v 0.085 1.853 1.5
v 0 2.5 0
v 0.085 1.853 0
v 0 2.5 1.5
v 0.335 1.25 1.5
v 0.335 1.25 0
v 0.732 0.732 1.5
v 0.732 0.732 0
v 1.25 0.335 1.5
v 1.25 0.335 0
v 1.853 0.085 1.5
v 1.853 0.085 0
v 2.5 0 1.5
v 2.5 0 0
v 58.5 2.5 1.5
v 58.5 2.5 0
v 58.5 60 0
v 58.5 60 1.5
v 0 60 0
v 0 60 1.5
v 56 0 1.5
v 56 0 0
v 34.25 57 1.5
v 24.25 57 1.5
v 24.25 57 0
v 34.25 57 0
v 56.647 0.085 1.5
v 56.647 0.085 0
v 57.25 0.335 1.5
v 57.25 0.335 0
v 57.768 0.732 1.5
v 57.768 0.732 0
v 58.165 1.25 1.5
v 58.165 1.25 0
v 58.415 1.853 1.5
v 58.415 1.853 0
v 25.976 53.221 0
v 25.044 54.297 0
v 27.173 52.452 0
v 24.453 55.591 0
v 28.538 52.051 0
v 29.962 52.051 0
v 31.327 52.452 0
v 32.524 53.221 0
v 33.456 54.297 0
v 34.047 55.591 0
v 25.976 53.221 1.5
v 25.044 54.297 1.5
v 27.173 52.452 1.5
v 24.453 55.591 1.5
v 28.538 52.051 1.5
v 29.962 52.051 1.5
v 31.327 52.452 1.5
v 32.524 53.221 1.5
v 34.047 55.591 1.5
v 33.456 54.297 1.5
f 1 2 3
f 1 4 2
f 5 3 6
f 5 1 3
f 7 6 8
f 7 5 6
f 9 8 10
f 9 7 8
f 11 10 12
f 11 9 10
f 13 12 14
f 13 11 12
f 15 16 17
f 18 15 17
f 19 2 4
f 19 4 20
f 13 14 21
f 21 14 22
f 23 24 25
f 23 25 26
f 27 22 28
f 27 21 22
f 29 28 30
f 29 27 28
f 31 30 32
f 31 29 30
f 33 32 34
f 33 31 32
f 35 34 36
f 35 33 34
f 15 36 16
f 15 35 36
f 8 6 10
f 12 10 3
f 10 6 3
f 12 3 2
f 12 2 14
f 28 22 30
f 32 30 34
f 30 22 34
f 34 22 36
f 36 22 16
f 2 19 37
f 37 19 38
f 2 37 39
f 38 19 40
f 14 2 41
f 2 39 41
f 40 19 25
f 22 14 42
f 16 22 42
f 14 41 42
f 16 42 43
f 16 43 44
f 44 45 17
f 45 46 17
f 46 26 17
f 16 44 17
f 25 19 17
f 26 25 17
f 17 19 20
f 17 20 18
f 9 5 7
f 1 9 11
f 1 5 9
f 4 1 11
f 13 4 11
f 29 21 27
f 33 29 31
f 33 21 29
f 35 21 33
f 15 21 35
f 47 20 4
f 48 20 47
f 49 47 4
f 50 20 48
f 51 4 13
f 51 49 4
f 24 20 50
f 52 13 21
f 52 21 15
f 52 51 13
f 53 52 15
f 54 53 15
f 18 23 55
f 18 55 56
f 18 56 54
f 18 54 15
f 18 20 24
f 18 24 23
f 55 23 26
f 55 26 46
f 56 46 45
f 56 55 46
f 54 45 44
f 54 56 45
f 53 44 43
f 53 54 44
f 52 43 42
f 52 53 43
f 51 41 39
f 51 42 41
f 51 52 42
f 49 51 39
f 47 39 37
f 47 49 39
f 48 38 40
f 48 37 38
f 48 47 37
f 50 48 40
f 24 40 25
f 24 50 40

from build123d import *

# Parameters (mm, degrees)
SKETCH_1_W          = 58.5
SKETCH_1_H          = 60
EXTRUDE_1_DEPTH     = 1.5
FILLET_1_R          = 2.5
CUT_EXTRUDE_1_DEPTH = 2.5


with BuildPart() as part:
    # Эскиз1 → Бобышка-Вытянуть1 (new body)
    with BuildSketch(Plane.XY):
        with Locations((29.25, 30)):
            Rectangle(SKETCH_1_W, SKETCH_1_H)
    extrude(amount=EXTRUDE_1_DEPTH)

    # Скругление1
    fillet_1_edges = [part.edges().sort_by_distance(p)[0] for p in [
        (58.5, 0, 0.75),
        (0, 0, 0.75),
    ]]
    fillet(fillet_1_edges, radius=FILLET_1_R)

    # Эскиз2 → Вырез-Вытянуть1 (cut, through all)
    with BuildSketch(Plane.XY.offset(1.5)):
        with BuildLine():
            Line((24.25, 57), (34.25, 57))
            ThreePointArc((34.25, 57), (29.25, 52), (24.25, 57))
        make_face()
    extrude(amount=-CUT_EXTRUDE_1_DEPTH, mode=Mode.SUBTRACT)


solid = part.part
